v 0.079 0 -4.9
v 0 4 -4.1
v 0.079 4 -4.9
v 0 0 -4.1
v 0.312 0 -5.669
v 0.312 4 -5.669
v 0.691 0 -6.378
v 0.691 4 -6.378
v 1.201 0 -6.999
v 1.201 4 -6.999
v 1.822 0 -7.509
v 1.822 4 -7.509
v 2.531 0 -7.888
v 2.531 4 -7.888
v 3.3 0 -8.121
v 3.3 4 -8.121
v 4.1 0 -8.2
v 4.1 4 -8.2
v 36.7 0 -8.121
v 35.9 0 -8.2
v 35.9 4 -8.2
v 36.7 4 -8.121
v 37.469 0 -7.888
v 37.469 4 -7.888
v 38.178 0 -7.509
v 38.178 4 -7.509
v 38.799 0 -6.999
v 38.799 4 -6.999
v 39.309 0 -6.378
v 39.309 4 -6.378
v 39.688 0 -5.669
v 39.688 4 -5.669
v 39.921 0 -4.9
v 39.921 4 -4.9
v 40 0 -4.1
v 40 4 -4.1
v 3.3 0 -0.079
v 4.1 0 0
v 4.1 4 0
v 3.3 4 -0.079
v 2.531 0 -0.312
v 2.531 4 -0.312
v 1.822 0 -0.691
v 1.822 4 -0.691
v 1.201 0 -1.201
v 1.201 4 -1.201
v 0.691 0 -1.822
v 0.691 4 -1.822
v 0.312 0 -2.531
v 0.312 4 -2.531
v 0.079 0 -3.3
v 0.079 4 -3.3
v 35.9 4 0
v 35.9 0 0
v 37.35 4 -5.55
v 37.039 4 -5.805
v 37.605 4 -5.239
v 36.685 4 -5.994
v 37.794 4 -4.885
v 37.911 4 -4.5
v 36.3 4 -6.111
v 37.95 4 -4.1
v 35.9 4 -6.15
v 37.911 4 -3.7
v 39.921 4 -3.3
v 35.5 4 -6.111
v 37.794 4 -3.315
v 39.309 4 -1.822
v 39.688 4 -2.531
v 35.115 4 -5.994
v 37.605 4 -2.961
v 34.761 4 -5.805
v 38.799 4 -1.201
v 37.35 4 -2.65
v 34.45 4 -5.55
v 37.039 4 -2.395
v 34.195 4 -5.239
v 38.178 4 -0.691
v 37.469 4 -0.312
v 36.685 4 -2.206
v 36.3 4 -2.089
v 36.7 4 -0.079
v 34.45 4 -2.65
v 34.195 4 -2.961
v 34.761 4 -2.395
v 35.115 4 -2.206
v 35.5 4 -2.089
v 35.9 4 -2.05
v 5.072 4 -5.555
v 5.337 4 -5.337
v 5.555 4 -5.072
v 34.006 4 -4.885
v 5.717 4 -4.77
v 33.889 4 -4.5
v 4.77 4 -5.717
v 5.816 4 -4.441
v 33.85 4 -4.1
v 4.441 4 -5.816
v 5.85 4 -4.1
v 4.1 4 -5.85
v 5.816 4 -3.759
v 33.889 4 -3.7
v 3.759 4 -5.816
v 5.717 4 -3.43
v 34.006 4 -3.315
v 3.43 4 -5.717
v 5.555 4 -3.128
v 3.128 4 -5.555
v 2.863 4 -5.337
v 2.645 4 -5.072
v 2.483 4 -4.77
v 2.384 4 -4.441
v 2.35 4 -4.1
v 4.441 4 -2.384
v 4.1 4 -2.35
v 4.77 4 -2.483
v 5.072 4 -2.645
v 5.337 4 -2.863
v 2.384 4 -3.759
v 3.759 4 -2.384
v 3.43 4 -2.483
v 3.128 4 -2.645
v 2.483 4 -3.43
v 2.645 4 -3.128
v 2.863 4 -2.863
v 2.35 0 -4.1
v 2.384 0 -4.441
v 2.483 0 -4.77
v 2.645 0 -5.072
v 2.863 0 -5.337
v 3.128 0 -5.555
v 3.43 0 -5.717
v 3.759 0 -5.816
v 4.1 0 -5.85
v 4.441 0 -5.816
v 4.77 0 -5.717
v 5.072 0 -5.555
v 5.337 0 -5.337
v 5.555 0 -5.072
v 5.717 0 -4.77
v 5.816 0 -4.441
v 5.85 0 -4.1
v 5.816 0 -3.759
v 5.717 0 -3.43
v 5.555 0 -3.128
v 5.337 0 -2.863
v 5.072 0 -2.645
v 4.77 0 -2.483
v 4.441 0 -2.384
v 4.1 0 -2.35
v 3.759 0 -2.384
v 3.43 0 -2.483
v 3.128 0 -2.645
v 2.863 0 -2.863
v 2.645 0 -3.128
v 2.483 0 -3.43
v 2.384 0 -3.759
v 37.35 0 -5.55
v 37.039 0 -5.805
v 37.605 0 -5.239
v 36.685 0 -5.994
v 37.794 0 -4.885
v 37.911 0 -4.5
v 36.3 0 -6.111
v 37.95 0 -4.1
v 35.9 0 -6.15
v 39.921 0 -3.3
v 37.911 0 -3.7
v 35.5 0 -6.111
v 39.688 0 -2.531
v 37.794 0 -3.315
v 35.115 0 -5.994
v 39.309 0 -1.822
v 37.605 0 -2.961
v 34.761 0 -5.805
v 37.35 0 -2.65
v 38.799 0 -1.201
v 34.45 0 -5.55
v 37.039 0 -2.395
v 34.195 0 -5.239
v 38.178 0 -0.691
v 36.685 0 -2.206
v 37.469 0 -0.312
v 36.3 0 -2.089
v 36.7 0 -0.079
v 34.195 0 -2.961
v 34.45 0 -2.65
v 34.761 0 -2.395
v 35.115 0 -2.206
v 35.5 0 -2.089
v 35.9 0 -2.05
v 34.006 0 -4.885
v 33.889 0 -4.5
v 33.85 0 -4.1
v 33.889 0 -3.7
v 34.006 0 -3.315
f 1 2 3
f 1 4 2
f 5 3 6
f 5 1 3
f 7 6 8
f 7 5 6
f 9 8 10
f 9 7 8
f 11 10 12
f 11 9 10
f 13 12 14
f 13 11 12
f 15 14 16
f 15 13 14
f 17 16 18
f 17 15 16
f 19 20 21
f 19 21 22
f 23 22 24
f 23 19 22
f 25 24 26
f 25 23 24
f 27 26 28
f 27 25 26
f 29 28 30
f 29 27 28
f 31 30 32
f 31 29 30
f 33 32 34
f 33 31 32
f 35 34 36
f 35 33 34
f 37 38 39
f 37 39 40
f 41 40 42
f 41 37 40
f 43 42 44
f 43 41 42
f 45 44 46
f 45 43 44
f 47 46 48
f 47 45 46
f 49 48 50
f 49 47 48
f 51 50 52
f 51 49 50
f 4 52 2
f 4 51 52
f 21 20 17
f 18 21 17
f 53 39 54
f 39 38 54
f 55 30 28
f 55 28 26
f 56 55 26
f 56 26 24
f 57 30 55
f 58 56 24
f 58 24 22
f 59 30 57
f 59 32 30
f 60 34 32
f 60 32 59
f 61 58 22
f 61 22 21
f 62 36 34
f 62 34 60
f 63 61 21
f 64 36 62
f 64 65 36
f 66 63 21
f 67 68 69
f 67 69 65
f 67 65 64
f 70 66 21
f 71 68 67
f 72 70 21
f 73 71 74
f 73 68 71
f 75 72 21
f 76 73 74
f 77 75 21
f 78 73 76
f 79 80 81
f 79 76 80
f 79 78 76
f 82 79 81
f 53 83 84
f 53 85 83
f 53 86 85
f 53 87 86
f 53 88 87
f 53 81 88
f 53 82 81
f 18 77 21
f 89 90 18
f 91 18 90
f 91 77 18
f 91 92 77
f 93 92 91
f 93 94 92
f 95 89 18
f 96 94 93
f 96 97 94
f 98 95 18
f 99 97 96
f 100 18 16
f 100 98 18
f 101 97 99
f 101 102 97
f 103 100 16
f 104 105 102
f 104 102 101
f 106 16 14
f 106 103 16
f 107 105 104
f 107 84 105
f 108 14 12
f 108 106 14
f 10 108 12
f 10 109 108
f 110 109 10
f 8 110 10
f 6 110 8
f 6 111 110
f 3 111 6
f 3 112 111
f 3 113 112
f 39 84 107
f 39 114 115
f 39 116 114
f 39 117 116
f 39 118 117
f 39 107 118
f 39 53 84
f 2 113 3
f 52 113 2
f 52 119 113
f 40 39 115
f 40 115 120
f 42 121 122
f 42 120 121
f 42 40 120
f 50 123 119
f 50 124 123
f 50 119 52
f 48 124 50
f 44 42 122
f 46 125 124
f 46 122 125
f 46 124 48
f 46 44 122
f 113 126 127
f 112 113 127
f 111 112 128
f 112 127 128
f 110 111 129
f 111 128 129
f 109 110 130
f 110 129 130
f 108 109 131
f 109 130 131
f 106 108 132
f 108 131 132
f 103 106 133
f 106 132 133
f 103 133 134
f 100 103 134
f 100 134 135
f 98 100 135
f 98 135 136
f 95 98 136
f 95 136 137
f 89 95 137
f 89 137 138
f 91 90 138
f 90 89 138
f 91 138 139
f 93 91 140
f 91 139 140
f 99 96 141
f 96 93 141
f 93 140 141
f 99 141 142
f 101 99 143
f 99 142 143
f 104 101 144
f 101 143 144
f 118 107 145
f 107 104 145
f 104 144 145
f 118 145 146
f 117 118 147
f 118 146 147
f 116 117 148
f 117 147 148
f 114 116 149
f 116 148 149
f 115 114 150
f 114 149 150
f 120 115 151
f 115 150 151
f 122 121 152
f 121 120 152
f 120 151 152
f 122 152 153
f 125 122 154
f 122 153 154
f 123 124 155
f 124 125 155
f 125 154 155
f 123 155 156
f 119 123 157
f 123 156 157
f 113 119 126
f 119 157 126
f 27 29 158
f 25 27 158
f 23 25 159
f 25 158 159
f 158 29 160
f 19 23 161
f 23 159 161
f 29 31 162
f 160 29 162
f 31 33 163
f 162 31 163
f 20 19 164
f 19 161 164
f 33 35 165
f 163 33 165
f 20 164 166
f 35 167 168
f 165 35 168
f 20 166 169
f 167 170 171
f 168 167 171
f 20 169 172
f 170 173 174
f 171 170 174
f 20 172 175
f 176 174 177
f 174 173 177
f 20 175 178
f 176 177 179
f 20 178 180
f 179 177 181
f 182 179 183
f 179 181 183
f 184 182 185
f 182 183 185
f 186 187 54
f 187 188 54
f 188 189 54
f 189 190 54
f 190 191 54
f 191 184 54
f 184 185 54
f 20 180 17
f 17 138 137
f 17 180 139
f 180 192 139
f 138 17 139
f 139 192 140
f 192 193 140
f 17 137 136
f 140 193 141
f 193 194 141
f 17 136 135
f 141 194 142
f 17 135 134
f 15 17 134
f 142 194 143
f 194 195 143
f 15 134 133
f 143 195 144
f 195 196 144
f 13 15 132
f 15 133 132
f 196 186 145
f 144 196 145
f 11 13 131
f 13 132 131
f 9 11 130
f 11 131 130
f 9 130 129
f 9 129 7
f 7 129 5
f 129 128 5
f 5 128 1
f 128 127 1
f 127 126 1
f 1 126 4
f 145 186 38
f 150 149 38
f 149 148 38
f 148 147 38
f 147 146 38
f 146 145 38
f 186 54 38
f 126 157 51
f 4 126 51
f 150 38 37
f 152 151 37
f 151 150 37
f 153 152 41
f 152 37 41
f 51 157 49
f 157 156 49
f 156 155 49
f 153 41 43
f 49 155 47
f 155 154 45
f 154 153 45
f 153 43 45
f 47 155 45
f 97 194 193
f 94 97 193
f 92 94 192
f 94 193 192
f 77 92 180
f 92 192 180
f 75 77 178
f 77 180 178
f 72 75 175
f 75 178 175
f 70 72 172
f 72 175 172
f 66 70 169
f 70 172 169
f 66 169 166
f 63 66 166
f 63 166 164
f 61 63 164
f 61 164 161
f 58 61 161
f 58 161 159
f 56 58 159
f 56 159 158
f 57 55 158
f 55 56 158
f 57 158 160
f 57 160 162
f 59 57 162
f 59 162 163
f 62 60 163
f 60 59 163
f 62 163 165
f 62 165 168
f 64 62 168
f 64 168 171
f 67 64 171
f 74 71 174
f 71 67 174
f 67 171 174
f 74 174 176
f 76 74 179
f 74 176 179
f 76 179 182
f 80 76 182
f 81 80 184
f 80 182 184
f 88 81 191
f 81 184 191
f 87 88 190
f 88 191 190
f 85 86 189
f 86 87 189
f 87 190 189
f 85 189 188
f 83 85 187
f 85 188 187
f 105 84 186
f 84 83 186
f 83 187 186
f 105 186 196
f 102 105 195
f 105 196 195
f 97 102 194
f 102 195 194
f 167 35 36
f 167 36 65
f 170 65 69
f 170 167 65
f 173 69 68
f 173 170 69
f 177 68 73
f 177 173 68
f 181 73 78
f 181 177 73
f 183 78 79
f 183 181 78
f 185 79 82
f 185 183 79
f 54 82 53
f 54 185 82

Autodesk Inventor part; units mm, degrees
ref_plane "YZ Plane" through (0, 0, 0) normal (1, 0, 0) x (0, 1, 0)
ref_plane "XZ Plane" through (0, 0, 0) normal (0, 1, 0) x (-1, 0, 0)
ref_plane "XY Plane" through (0, 0, 0) normal (0, 0, 1) x (1, 0, 0)
sketch "Sketch1" plane through (0, 0, 0) normal (0, 1, 0) x (-1, 0, 0)
  line L0 (-4.1, 0) -> (-35.9, 0)
  line L1 (-40, -4.1) -> (-40, -4.1)
  line L2 (-35.9, -8.2) -> (-4.1, -8.2)
  line L3 (0, -4.1) -> (0, -4.1)
  circle A0 centre (-35.9, -4.1) radius 2.05
  circle A1 centre (-4.1, -4.1) radius 1.75
  arc A2 (-4.1, -8.2) -> (0, -4.1) centre (-4.1, -4.1) ccw
  arc A3 (0, -4.1) -> (-4.1, 0) centre (-4.1, -4.1) ccw
  arc A4 (-35.9, 0) -> (-40, -4.1) centre (-35.9, -4.1) ccw
  arc A5 (-40, -4.1) -> (-35.9, -8.2) centre (-35.9, -4.1) ccw
  point P0 (0, 0)
  point P1 (-40, -8.2)
  point P2 (-40, 0)
  point P3 (0, -8.2)
  point P4 (-40, -4.1)
  point P5 (0, -4.1)
  dimension "d0" = 40
  dimension "d1" = 8.2
  dimension "d2" = 4.1
  dimension "d3" = 3.5
  dimension "d4" = 4.1
  dimension "d5" = 4.1
  dimension "d6" = 4.1
  dimension "d7" = 4.1
  dimension "d8" = 4.1
extrude "Extrusion1" add sketch "Sketch1" along normal blind 4
equation "\"d1\" = 2 * arm_rod_diam"
equation "\"d2\" = arm_rod_diam"
equation "\"d4\" = 0.5 * d1"
equation "\"d5\" = d4"
equation "\"d6\" = d4"
equation "\"d7\" = d5"
equation "\"d8\" = arm_rod_diam"
equation "\"arm_rod_diam\" = 4.1"
properties part number "config_arm" material "ABS Plastic"
